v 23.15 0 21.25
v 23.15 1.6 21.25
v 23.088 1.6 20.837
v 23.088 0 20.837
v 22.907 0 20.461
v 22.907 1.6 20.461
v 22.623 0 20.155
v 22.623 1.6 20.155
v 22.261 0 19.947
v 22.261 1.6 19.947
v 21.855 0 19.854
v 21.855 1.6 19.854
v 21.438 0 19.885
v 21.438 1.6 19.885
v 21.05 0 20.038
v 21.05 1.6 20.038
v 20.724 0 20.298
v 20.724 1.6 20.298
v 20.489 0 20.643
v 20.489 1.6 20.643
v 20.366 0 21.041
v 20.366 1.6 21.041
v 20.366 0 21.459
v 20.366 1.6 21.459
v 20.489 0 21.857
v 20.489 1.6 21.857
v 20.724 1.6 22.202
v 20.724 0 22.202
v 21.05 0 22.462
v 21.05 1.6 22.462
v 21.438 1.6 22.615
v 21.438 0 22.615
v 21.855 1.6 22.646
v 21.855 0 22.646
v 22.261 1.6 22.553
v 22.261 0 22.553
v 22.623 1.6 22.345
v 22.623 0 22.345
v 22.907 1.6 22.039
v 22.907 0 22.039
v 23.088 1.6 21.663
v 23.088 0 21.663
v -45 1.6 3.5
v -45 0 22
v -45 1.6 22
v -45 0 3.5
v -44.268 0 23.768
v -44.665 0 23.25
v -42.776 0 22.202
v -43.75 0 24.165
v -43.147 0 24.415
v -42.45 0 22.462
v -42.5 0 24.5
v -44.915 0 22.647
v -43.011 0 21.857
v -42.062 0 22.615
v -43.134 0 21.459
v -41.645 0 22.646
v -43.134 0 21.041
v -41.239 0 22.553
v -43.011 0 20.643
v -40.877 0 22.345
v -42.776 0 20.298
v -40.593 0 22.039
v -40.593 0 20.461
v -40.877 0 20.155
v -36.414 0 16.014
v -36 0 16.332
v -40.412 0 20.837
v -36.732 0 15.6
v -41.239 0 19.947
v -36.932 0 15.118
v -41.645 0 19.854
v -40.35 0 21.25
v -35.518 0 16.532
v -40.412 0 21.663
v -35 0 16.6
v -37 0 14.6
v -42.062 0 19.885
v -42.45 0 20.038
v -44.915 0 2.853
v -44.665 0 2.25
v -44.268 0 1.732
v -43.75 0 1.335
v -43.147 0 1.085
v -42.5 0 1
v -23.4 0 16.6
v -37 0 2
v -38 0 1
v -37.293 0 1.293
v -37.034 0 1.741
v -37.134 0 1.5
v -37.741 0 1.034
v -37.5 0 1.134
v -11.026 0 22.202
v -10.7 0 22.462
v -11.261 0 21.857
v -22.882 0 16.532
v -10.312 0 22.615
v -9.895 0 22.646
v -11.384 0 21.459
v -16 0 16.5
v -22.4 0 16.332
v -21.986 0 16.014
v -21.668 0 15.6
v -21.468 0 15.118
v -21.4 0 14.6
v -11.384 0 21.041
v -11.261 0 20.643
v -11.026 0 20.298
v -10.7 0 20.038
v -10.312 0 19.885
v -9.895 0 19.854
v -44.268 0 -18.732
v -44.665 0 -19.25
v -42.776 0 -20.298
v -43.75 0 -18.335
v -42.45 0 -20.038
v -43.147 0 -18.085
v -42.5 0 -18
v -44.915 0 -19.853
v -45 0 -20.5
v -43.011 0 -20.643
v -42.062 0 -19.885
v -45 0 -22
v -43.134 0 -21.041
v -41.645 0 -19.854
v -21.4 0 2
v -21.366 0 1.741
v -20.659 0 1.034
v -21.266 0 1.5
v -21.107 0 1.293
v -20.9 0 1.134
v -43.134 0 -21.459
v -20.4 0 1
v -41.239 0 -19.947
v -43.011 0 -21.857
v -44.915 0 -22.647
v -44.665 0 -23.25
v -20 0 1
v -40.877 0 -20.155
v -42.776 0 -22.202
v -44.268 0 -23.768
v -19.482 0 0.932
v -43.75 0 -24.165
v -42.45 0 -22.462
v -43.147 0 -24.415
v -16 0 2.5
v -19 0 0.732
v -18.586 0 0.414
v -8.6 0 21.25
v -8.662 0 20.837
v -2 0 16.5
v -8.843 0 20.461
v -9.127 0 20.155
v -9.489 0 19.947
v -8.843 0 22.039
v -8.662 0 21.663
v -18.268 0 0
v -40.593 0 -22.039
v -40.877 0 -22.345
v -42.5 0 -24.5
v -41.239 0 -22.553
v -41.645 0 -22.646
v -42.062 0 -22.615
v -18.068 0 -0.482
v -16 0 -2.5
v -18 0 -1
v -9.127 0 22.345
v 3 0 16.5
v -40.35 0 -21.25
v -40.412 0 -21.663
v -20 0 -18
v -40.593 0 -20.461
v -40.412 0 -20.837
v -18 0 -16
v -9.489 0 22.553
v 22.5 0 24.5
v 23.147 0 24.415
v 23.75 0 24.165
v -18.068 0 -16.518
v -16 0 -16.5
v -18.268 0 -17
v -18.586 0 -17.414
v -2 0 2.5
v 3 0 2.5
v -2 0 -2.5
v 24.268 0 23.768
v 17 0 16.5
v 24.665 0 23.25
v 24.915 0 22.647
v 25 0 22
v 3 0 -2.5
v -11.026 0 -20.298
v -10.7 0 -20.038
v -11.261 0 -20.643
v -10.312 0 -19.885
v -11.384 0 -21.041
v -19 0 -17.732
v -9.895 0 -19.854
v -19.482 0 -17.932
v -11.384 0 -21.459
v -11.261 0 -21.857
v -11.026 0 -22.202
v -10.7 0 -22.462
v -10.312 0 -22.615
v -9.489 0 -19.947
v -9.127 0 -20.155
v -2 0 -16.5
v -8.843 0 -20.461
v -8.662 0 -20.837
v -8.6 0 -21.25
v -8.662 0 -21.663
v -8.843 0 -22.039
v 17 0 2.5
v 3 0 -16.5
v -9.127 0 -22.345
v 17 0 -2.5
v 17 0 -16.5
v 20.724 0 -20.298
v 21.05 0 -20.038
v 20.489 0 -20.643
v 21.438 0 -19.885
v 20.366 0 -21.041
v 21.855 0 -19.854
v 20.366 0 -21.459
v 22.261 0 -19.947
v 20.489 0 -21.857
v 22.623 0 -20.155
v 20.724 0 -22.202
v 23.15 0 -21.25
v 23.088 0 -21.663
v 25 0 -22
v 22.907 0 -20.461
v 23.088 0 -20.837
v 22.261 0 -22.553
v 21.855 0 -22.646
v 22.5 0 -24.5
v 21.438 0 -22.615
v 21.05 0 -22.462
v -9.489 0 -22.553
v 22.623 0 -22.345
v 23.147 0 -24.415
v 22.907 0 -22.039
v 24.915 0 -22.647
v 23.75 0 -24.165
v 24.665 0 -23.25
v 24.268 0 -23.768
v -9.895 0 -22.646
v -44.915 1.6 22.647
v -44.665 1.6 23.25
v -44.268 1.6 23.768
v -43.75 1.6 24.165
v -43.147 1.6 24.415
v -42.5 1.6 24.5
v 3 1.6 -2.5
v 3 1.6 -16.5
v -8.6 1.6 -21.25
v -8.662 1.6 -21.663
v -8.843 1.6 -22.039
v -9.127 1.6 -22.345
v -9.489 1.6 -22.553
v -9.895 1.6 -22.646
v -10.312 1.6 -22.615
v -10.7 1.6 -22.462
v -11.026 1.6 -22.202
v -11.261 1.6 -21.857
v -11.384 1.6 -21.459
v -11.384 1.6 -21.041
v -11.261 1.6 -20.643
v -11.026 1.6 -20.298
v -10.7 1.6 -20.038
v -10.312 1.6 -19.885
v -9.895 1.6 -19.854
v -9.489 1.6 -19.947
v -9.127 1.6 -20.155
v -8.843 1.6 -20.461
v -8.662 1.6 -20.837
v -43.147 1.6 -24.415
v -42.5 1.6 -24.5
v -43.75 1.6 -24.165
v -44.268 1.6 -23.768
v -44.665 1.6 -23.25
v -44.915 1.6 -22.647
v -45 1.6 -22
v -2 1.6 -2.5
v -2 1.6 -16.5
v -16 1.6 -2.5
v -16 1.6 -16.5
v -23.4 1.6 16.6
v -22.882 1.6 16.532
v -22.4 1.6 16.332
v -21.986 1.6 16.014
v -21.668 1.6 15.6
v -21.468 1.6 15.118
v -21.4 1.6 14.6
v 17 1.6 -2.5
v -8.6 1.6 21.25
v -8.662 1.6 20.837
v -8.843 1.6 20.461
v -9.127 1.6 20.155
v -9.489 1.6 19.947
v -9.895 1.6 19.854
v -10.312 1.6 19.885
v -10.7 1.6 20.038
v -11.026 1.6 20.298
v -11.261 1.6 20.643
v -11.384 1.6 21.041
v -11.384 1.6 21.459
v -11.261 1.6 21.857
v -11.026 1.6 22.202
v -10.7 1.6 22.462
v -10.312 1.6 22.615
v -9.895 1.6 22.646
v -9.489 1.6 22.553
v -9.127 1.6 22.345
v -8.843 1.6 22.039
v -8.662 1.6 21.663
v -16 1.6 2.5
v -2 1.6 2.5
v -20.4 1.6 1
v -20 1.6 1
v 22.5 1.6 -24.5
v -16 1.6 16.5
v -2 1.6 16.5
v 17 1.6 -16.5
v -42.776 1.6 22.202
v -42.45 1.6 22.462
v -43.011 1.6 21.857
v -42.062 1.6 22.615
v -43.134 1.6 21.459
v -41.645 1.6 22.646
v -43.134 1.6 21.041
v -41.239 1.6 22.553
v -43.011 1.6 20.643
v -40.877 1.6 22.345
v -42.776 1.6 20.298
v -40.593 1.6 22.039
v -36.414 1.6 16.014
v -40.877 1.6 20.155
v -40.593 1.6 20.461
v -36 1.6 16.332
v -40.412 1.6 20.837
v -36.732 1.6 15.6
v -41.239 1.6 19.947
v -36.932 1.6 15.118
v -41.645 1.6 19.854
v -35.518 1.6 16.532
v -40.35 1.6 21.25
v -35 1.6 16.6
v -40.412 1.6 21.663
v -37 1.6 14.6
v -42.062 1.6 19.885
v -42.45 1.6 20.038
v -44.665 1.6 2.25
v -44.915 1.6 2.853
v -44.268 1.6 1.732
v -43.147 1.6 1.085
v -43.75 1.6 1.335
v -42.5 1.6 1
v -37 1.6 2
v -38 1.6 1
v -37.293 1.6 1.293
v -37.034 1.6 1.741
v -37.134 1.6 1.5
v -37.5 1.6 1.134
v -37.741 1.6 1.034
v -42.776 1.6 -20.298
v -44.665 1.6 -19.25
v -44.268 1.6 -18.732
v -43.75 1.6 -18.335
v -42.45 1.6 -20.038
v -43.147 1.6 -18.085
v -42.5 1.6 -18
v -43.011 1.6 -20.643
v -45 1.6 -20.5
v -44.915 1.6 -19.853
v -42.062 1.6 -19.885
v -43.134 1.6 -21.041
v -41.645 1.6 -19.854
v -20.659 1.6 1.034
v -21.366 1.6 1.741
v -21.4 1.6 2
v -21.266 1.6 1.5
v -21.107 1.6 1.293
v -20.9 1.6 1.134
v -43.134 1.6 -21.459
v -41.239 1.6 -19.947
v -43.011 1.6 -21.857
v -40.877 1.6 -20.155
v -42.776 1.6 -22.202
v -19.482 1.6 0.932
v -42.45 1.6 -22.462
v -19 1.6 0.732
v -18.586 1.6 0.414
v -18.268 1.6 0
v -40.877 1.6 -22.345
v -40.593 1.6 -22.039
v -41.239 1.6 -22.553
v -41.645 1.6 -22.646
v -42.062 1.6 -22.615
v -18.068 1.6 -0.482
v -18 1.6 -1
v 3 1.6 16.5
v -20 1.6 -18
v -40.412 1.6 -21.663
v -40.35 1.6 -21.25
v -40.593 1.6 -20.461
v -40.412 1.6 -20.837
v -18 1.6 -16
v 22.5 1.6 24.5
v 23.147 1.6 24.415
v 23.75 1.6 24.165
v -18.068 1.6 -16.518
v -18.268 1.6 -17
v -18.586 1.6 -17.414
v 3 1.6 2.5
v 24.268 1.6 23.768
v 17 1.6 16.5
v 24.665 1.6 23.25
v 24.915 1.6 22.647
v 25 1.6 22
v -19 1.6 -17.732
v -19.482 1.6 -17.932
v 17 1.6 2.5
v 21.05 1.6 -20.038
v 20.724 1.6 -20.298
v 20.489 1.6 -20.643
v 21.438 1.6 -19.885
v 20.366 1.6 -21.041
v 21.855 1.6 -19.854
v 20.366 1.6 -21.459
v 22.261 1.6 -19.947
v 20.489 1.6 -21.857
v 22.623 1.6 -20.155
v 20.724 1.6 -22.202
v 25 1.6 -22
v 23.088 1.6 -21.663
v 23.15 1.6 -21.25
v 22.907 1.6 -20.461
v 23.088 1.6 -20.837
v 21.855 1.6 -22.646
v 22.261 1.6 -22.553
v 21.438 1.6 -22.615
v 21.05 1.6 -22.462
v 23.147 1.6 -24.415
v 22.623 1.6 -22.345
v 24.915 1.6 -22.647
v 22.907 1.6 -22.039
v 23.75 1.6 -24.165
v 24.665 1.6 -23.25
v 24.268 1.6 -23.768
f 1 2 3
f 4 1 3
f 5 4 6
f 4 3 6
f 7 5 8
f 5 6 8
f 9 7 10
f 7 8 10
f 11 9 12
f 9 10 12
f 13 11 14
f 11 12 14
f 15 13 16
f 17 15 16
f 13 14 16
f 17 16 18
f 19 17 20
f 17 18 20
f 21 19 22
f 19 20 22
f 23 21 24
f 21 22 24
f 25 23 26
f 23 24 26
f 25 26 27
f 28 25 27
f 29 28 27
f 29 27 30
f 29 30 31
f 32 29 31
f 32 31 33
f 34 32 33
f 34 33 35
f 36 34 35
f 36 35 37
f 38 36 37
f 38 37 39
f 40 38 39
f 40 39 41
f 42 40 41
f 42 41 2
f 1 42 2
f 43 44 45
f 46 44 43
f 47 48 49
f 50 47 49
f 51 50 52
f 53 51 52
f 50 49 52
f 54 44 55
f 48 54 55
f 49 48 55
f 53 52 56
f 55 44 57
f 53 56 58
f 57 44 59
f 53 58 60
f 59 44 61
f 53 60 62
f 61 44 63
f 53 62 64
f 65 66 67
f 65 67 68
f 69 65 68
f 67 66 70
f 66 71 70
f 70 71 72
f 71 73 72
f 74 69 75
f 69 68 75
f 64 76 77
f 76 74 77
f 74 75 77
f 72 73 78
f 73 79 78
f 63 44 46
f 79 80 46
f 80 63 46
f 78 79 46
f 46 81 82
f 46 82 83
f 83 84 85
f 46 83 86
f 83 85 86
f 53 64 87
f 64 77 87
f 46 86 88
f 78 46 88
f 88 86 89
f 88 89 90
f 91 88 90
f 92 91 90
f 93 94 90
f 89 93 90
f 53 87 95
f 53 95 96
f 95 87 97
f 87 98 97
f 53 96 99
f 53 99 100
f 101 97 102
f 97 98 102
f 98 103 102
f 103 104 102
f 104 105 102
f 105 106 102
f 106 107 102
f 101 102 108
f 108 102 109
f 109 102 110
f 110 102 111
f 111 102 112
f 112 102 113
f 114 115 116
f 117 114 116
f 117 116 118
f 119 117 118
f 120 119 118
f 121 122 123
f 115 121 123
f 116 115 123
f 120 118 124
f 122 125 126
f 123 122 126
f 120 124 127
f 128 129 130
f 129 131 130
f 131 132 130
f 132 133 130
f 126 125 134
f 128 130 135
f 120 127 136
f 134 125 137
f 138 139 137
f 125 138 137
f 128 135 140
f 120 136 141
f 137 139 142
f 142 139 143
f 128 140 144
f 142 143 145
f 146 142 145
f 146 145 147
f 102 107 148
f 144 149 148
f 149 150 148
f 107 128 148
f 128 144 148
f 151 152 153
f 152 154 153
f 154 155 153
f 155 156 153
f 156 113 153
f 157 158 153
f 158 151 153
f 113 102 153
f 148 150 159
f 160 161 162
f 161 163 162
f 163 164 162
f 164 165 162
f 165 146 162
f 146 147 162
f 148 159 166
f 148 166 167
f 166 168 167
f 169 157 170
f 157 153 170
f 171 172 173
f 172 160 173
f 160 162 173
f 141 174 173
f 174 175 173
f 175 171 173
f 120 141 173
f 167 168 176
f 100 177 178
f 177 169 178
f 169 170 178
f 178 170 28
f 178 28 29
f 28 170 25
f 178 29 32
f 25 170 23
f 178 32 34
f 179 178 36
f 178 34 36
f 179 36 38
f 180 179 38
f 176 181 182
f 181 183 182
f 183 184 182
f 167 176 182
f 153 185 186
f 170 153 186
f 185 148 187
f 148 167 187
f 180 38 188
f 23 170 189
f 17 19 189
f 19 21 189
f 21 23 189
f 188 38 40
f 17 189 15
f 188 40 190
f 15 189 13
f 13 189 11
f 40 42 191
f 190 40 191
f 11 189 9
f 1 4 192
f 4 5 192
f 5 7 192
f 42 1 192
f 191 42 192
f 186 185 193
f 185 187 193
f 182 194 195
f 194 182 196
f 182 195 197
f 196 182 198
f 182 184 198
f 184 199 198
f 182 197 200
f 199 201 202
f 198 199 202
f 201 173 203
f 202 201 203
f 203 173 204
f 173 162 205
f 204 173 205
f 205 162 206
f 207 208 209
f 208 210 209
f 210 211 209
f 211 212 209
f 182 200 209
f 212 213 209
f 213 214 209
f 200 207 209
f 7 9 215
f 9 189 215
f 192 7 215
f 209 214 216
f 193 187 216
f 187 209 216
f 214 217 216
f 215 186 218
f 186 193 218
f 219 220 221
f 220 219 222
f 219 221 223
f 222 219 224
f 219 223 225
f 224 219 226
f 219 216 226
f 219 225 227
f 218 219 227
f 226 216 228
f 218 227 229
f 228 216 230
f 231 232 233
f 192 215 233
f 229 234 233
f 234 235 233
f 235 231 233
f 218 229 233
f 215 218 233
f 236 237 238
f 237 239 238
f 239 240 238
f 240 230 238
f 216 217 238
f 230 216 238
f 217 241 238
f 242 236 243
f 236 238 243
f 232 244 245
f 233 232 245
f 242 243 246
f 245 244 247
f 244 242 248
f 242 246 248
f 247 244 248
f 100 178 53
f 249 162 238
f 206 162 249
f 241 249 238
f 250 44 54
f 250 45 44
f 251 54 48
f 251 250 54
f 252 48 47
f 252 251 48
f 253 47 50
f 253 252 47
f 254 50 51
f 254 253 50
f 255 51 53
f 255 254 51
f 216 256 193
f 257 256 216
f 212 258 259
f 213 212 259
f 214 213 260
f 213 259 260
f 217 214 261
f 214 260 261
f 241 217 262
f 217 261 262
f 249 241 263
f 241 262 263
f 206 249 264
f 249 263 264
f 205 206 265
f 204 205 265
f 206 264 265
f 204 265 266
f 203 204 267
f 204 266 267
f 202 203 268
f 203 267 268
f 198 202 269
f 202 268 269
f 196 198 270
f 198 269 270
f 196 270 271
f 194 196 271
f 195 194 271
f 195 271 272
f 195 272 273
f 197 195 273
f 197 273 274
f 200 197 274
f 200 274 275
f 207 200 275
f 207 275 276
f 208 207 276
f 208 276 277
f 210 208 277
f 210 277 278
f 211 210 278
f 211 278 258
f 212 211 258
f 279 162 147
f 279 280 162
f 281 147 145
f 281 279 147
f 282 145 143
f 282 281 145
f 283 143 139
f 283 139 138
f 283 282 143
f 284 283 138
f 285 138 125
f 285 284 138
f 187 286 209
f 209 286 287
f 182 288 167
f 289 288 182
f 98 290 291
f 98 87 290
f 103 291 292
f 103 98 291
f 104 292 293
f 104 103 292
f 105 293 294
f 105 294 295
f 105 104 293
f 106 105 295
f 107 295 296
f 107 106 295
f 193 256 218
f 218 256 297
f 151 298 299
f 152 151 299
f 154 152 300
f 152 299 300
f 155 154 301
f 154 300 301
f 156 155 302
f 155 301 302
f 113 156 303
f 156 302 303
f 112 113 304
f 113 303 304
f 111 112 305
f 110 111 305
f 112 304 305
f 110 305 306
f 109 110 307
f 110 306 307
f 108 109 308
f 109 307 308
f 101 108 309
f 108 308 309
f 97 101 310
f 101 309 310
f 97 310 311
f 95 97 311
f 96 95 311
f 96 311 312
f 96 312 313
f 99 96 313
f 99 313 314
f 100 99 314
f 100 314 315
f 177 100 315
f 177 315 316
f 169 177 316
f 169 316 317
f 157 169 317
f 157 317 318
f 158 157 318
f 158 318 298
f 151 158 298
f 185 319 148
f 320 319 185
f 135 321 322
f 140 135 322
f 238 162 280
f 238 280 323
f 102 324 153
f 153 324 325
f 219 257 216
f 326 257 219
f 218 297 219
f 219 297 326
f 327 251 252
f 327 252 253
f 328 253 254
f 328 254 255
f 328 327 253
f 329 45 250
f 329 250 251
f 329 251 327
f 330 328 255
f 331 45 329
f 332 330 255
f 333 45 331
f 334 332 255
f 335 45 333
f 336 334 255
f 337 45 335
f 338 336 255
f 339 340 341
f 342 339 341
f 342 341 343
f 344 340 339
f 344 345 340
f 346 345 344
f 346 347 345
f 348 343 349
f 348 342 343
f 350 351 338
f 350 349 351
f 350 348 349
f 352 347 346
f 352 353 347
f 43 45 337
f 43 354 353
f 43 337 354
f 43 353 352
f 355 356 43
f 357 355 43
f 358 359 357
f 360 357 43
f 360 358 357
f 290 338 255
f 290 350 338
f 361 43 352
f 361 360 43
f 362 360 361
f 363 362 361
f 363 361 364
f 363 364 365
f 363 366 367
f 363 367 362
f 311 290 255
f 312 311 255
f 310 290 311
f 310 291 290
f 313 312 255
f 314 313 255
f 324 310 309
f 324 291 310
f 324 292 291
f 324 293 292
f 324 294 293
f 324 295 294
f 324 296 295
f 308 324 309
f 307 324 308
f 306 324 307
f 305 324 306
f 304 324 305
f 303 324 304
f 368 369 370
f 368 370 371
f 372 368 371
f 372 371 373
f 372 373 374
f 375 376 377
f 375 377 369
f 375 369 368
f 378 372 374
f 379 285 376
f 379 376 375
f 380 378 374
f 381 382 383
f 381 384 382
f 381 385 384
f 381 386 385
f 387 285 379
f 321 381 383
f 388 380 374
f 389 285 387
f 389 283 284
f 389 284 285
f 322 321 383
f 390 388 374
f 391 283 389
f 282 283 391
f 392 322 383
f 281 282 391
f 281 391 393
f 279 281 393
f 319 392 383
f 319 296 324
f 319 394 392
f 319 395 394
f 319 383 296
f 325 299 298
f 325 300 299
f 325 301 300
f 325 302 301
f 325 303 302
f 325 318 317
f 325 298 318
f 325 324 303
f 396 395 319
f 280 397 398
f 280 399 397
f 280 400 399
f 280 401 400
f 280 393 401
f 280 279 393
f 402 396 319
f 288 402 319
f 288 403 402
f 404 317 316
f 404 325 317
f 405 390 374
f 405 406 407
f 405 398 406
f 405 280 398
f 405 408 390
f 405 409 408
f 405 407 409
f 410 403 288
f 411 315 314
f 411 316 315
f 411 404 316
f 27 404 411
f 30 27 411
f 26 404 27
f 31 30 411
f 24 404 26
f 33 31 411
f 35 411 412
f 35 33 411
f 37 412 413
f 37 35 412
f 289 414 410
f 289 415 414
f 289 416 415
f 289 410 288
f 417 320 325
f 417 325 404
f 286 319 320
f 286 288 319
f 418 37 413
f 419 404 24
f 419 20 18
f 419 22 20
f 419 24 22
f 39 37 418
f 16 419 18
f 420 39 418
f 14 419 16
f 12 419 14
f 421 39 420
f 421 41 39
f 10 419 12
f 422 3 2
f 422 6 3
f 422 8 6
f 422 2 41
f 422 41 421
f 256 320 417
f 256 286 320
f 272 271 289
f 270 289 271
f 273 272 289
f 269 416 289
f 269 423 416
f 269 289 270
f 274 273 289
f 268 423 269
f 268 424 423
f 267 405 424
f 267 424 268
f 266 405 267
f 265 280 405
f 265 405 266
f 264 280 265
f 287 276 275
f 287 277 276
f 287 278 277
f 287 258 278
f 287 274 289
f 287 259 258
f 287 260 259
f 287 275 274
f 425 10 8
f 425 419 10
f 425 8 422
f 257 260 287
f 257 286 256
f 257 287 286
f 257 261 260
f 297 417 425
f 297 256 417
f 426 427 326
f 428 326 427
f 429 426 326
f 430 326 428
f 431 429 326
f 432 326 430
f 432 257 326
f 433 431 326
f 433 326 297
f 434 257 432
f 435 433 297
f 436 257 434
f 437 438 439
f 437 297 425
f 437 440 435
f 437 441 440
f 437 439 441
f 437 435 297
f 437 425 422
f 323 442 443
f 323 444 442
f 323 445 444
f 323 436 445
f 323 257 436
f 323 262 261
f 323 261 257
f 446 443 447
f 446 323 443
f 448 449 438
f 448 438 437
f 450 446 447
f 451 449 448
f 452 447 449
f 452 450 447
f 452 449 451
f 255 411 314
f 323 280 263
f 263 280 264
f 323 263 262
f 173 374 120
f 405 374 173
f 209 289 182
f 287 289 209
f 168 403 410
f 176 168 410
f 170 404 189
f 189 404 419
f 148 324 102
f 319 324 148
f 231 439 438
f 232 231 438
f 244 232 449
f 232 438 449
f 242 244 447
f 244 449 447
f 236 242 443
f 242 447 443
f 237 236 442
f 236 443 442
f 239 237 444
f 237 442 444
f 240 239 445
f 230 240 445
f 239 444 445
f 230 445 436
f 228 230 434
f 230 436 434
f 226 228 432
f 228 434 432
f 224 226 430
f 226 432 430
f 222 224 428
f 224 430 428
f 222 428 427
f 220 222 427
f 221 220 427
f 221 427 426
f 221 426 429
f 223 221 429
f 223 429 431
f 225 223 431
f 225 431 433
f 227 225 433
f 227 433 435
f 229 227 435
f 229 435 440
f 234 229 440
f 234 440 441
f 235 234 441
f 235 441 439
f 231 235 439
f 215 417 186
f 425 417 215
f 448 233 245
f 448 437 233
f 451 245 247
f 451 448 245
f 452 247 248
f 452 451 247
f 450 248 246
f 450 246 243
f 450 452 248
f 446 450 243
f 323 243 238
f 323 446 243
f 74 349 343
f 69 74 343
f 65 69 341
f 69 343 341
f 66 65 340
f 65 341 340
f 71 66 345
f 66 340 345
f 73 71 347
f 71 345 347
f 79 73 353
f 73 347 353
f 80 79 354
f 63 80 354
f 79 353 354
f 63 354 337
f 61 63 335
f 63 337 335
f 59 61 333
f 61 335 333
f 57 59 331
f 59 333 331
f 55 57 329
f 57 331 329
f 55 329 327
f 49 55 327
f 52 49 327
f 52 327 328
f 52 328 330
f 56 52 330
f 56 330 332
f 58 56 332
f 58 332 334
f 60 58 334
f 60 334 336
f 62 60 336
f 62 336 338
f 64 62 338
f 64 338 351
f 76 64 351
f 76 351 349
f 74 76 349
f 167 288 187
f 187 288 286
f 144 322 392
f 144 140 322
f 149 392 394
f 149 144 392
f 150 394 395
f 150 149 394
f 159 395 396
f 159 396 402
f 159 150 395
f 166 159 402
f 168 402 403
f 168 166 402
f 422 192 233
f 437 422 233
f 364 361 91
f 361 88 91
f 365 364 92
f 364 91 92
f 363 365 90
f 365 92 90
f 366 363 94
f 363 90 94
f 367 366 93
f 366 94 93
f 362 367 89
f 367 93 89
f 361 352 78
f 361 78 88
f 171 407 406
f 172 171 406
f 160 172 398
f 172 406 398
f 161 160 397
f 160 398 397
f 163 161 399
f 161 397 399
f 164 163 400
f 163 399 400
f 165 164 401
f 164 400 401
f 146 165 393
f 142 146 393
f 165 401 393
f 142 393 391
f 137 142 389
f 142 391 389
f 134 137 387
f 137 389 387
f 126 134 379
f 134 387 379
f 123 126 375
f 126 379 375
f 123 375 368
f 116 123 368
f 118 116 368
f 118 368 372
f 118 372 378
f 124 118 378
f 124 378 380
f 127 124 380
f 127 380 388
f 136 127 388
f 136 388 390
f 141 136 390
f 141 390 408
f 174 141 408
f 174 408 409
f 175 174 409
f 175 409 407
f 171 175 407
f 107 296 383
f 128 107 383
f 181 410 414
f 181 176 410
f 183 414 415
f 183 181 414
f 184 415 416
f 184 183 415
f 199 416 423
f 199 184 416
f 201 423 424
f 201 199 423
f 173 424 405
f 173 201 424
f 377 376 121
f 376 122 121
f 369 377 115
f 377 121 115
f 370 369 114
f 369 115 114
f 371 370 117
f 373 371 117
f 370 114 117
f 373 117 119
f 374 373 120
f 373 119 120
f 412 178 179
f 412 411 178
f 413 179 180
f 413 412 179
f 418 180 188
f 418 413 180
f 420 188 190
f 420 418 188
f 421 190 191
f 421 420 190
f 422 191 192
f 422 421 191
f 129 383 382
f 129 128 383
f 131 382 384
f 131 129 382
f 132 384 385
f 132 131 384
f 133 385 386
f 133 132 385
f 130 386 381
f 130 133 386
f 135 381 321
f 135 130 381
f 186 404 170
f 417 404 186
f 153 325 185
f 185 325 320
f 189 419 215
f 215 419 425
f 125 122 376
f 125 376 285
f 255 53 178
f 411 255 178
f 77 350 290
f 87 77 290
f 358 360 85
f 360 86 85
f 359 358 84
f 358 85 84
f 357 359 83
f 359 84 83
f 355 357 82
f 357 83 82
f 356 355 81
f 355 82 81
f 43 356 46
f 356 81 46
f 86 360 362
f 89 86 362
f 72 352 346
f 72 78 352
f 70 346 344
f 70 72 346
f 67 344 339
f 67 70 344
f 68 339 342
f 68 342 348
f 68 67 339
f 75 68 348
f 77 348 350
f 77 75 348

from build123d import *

# Parameters (mm, degrees)
SKETCH1_W            = 40
SKETCH1_H            = 39
BOSS_EXTRUDE1_DEPTH  = 1.6
SKETCH3_W            = 70
SKETCH3_H            = 49
BOSS_EXTRUDE2_DEPTH  = 1.6
SKETCH4_W            = 27
SKETCH4_H            = 19
CUT_EXTRUDE1_DEPTH   = 2.6
FILLET1_R            = 2
SKETCH5_W            = 15.6
SKETCH5_H            = 15.6
CUT_EXTRUDE2_DEPTH   = 2.6
FILLET2_R            = 2
FILLET3_R            = 1
SKETCH6_R            = 1.4
CUT_EXTRUDE3_DEPTH   = 2.6
FILLET4_R            = 2.5
SKETCH7_W            = 14
SKETCH7_H            = 14
CUT_EXTRUDE4_DEPTH   = 2.6
LPATTERN1_COUNT      = 2
LPATTERN1_PITCH      = 19
LPATTERN1_COUNT_DIR2 = 2
LPATTERN1_PITCH_DIR2 = 19


with BuildPart() as part:
    # Sketch1 → Boss-Extrude1 (new body)
    with BuildSketch(Plane(origin=(0, 0, 0), x_dir=(1, 0, 0), z_dir=(0, 1, 0))):
        Rectangle(SKETCH1_W, SKETCH1_H)
    extrude(amount=BOSS_EXTRUDE1_DEPTH)

    # Sketch3 → Boss-Extrude2 (add)
    with BuildSketch(Plane(origin=(0, 0, 0), x_dir=(1, 0, 0), z_dir=(0, 1, 0))):
        with Locations((-10, 0)):
            Rectangle(SKETCH3_W, SKETCH3_H)
    extrude(amount=BOSS_EXTRUDE2_DEPTH)

    # Sketch4 → Cut-Extrude1 (cut, through all)
    with BuildSketch(Plane(origin=(0, 1.6, 0), x_dir=(1, 0, 0), z_dir=(0, 1, 0))):
        with Locations((-31.5, 8.5)):
            Rectangle(SKETCH4_W, SKETCH4_H)
    extrude(amount=-CUT_EXTRUDE1_DEPTH, mode=Mode.SUBTRACT)

    # Fillet1
    fillet1_edges = [part.edges().sort_by_distance(p)[0] for p in [
        (-18, 0.8, -18),
        (-18, 0.8, 1),
    ]]
    fillet(fillet1_edges, radius=FILLET1_R)

    # Sketch5 → Cut-Extrude2 (cut, through all)
    with BuildSketch(Plane(origin=(0, 1.6, 0), x_dir=(1, 0, 0), z_dir=(0, 1, 0))):
        with Locations((-29.2, -8.8)):
            Rectangle(SKETCH5_W, SKETCH5_H)
    extrude(amount=-CUT_EXTRUDE2_DEPTH, mode=Mode.SUBTRACT)

    # Fillet2
    fillet2_edges = [part.edges().sort_by_distance(p)[0] for p in [
        (-37, 0.8, 16.6),
        (-21.4, 0.8, 16.6),
    ]]
    fillet(fillet2_edges, radius=FILLET2_R)

    # Fillet3
    fillet3_edges = [part.edges().sort_by_distance(p)[0] for p in [
        (-37, 0.8, 1),
        (-21.4, 0.8, 1),
    ]]
    fillet(fillet3_edges, radius=FILLET3_R)

    # Sketch6 → Cut-Extrude3 (cut, through all)
    with BuildSketch(Plane(origin=(0, 1.6, 0), x_dir=(1, 0, 0), z_dir=(0, 1, 0))):
        with Locations((-41.75, 21.25)):
            Circle(SKETCH6_R)
        with Locations((21.75, 21.25)):
            Circle(SKETCH6_R)
        with Locations((21.75, -21.25)):
            Circle(SKETCH6_R)
        with Locations((-41.75, -21.25)):
            Circle(SKETCH6_R)
        with Locations((-10, -21.25)):
            Circle(SKETCH6_R)
        with Locations((-10, 21.25)):
            Circle(SKETCH6_R)
    extrude(amount=-CUT_EXTRUDE3_DEPTH, mode=Mode.SUBTRACT)

    # Fillet4
    fillet4_edges = [part.edges().sort_by_distance(p)[0] for p in [
        (25, 0.8, 24.5),
        (25, 0.8, -24.5),
        (-45, 0.8, -24.5),
        (-45, 0.8, 24.5),
        (-45, 0.8, 1),
        (-45, 0.8, -18),
    ]]
    fillet(fillet4_edges, radius=FILLET4_R)

    # Sketch7 → Cut-Extrude4 (cut, through all)
    with BuildSketch(Plane(origin=(0, 1.6, 0), x_dir=(1, 0, 0), z_dir=(0, 1, 0))):
        with Locations((-9, 9.5)):
            Rectangle(SKETCH7_W, SKETCH7_H)
    cut_extrude4 = extrude(amount=-CUT_EXTRUDE4_DEPTH, mode=Mode.SUBTRACT)

    # LPattern1: Cut-Extrude4 2 × 2
    with Locations(*[(i * LPATTERN1_PITCH, 0, j * LPATTERN1_PITCH_DIR2) for i in range(LPATTERN1_COUNT) for j in range(LPATTERN1_COUNT_DIR2) if (i, j) != (0, 0)]):
        add(cut_extrude4, mode=Mode.SUBTRACT)


solid = part.part
